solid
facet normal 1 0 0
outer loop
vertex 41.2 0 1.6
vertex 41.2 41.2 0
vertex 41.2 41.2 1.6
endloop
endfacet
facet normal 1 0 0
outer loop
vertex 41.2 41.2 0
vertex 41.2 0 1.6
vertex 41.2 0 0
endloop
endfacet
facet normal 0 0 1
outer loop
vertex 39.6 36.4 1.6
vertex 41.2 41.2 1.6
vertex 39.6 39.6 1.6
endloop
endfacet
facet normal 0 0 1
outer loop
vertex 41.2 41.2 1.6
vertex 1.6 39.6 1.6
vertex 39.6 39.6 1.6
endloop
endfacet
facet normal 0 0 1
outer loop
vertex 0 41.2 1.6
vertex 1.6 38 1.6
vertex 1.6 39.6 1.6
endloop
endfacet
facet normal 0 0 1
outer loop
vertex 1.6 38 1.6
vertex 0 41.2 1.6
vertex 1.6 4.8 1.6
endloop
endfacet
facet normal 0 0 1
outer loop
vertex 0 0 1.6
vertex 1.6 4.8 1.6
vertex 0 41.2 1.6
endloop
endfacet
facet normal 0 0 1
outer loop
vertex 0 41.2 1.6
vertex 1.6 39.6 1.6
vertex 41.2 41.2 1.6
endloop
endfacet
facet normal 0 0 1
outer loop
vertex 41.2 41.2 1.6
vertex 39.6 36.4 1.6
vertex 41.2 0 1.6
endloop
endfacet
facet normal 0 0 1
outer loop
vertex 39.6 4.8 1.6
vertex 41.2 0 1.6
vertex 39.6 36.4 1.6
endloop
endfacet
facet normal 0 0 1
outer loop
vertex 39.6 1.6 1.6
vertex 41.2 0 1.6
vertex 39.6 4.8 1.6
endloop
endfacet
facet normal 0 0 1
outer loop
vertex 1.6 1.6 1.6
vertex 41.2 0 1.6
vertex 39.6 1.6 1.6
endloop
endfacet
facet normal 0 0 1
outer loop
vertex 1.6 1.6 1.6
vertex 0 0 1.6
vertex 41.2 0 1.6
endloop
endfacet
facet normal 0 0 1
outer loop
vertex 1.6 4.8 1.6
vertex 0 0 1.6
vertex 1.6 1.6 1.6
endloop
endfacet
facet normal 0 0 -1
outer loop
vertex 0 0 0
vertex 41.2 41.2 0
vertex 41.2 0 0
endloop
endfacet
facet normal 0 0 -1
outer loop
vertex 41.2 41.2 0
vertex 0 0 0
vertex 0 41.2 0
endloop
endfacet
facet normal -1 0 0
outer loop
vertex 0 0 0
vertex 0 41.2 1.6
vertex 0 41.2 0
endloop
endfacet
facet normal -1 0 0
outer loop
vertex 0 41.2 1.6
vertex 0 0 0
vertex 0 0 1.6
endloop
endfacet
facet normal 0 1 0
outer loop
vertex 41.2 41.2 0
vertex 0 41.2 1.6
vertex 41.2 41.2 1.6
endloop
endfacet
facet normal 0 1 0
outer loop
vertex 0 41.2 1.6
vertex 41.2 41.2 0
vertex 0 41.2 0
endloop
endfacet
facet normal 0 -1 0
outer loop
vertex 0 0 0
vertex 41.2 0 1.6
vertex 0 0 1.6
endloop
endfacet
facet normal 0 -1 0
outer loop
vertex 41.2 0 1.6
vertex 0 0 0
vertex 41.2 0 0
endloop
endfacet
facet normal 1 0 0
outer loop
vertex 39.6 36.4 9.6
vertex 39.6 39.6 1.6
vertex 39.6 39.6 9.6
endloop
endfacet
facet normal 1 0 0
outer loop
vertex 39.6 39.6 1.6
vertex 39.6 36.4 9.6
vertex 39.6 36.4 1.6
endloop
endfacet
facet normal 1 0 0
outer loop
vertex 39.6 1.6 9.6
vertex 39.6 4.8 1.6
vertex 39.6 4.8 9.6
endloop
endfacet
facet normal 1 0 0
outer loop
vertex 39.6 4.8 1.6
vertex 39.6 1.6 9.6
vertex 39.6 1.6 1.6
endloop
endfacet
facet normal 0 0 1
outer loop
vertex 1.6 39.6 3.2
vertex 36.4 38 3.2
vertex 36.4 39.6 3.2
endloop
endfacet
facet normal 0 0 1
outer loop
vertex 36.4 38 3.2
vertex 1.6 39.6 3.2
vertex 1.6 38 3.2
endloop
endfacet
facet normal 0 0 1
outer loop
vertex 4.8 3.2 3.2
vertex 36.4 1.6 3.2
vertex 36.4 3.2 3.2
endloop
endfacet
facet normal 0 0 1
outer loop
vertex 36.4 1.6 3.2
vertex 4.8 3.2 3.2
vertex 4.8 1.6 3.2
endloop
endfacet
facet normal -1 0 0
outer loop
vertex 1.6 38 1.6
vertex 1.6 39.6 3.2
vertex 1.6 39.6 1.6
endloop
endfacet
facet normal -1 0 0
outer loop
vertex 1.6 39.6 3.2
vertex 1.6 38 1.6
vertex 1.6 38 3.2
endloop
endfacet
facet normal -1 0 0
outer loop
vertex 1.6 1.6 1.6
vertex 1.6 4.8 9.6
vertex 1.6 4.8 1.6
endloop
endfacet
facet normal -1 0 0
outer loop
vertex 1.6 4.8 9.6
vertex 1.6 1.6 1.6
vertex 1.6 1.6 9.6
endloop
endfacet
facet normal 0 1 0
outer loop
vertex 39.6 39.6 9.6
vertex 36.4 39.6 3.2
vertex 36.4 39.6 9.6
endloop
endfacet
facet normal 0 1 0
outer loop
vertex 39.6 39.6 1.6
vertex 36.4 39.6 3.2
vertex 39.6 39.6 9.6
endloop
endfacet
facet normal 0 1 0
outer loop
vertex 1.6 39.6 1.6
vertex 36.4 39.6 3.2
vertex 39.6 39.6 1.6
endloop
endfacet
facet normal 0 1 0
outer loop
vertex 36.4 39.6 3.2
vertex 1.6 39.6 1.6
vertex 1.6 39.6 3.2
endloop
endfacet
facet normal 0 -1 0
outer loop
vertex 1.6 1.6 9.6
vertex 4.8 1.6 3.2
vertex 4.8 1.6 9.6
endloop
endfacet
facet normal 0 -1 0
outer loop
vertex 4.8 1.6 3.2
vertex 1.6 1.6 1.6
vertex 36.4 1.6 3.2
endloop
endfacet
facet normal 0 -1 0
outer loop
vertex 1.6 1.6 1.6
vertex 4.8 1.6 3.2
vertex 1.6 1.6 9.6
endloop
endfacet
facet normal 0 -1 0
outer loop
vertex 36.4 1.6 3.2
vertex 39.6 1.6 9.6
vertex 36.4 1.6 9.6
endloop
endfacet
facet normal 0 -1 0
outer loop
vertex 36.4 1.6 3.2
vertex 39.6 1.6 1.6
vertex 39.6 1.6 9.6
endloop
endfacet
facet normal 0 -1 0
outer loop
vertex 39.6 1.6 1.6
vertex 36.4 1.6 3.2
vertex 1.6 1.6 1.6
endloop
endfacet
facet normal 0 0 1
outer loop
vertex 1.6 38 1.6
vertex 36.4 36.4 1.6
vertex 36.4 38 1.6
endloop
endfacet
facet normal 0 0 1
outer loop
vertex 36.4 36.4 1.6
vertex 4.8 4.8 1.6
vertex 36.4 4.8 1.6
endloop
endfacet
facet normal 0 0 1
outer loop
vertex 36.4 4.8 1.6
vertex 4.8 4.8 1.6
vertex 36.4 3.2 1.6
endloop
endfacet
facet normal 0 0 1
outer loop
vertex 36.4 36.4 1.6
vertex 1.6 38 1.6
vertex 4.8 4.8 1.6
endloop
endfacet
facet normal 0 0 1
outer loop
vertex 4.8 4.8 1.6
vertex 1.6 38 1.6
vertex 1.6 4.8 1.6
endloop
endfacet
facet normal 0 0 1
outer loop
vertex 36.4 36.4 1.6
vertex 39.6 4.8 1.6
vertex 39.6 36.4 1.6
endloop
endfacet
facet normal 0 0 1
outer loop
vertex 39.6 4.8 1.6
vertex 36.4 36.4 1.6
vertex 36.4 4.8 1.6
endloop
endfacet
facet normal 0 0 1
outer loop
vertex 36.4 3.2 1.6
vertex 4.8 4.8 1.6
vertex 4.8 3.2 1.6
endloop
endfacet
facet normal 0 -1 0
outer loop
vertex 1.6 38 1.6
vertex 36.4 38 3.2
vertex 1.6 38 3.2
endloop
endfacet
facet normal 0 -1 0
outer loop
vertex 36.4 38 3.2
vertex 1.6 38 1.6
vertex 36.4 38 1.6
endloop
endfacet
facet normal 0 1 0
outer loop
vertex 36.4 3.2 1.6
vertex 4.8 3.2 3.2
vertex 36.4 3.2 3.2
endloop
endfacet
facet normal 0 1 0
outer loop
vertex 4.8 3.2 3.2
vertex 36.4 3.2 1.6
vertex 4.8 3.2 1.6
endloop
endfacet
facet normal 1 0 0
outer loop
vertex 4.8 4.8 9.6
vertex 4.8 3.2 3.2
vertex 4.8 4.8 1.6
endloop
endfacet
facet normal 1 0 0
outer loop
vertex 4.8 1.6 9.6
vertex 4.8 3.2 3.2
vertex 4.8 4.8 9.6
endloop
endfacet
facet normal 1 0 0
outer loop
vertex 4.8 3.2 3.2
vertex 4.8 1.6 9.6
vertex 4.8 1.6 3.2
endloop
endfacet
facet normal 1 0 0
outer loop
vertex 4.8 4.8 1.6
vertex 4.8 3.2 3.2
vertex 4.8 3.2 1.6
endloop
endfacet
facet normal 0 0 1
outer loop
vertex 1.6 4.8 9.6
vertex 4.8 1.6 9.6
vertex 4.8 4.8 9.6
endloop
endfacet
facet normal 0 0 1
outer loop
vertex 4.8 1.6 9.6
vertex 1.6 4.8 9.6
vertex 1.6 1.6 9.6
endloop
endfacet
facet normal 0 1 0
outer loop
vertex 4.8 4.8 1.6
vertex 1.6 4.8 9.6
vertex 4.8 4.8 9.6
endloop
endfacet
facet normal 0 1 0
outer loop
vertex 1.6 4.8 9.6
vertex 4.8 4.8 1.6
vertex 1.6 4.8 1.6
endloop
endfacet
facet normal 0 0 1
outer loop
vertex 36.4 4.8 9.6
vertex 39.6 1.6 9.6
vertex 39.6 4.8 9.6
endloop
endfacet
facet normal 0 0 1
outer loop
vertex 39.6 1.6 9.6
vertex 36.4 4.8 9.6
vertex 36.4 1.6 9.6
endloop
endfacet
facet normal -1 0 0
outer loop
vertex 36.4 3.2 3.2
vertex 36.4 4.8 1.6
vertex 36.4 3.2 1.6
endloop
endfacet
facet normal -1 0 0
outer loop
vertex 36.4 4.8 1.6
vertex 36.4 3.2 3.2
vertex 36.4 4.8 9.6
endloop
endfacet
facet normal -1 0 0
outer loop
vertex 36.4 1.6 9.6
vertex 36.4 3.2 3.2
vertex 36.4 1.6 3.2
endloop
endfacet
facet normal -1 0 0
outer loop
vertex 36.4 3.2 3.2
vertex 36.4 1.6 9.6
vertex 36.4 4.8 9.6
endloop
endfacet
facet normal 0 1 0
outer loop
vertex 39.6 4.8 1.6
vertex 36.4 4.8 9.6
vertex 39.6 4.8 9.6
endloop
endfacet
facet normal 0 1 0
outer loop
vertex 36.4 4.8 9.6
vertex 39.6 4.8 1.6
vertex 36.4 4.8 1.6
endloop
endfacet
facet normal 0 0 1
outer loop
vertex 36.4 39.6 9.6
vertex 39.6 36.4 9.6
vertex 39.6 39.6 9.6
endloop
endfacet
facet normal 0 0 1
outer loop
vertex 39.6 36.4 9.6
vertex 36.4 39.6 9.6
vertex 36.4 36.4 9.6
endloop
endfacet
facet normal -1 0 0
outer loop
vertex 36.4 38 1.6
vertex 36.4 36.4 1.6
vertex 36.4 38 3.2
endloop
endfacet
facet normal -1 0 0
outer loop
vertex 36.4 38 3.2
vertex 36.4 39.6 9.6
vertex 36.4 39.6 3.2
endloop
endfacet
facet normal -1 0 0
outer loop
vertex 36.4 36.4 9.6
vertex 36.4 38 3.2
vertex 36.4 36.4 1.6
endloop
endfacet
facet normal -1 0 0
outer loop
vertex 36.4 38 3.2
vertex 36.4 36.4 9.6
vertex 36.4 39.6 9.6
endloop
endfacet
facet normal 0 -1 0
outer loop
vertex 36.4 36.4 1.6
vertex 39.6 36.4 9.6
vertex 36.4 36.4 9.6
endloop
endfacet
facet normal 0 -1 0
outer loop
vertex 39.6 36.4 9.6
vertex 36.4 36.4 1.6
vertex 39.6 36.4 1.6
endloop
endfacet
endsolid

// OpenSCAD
$fn=50;
wand=4*0.4;
X=38;
Y=38;
Z=31;
abstand=8;

union() {
difference() {
union() {
    cube([X+2*wand,Y+2*wand,wand]);
    translate([wand,wand,wand])cube([X,Y,wand]);
    }
translate([wand,2*wand,wand])cube([X,Y-2*wand,Z]);
}

translate([wand,wand,wand])cube([2*wand,2*wand,abstand]);
translate([X-wand,wand,wand])cube([2*wand,2*wand,abstand]);
translate([X-wand,Y-wand,wand])cube([2*wand,2*wand,abstand]);
}
